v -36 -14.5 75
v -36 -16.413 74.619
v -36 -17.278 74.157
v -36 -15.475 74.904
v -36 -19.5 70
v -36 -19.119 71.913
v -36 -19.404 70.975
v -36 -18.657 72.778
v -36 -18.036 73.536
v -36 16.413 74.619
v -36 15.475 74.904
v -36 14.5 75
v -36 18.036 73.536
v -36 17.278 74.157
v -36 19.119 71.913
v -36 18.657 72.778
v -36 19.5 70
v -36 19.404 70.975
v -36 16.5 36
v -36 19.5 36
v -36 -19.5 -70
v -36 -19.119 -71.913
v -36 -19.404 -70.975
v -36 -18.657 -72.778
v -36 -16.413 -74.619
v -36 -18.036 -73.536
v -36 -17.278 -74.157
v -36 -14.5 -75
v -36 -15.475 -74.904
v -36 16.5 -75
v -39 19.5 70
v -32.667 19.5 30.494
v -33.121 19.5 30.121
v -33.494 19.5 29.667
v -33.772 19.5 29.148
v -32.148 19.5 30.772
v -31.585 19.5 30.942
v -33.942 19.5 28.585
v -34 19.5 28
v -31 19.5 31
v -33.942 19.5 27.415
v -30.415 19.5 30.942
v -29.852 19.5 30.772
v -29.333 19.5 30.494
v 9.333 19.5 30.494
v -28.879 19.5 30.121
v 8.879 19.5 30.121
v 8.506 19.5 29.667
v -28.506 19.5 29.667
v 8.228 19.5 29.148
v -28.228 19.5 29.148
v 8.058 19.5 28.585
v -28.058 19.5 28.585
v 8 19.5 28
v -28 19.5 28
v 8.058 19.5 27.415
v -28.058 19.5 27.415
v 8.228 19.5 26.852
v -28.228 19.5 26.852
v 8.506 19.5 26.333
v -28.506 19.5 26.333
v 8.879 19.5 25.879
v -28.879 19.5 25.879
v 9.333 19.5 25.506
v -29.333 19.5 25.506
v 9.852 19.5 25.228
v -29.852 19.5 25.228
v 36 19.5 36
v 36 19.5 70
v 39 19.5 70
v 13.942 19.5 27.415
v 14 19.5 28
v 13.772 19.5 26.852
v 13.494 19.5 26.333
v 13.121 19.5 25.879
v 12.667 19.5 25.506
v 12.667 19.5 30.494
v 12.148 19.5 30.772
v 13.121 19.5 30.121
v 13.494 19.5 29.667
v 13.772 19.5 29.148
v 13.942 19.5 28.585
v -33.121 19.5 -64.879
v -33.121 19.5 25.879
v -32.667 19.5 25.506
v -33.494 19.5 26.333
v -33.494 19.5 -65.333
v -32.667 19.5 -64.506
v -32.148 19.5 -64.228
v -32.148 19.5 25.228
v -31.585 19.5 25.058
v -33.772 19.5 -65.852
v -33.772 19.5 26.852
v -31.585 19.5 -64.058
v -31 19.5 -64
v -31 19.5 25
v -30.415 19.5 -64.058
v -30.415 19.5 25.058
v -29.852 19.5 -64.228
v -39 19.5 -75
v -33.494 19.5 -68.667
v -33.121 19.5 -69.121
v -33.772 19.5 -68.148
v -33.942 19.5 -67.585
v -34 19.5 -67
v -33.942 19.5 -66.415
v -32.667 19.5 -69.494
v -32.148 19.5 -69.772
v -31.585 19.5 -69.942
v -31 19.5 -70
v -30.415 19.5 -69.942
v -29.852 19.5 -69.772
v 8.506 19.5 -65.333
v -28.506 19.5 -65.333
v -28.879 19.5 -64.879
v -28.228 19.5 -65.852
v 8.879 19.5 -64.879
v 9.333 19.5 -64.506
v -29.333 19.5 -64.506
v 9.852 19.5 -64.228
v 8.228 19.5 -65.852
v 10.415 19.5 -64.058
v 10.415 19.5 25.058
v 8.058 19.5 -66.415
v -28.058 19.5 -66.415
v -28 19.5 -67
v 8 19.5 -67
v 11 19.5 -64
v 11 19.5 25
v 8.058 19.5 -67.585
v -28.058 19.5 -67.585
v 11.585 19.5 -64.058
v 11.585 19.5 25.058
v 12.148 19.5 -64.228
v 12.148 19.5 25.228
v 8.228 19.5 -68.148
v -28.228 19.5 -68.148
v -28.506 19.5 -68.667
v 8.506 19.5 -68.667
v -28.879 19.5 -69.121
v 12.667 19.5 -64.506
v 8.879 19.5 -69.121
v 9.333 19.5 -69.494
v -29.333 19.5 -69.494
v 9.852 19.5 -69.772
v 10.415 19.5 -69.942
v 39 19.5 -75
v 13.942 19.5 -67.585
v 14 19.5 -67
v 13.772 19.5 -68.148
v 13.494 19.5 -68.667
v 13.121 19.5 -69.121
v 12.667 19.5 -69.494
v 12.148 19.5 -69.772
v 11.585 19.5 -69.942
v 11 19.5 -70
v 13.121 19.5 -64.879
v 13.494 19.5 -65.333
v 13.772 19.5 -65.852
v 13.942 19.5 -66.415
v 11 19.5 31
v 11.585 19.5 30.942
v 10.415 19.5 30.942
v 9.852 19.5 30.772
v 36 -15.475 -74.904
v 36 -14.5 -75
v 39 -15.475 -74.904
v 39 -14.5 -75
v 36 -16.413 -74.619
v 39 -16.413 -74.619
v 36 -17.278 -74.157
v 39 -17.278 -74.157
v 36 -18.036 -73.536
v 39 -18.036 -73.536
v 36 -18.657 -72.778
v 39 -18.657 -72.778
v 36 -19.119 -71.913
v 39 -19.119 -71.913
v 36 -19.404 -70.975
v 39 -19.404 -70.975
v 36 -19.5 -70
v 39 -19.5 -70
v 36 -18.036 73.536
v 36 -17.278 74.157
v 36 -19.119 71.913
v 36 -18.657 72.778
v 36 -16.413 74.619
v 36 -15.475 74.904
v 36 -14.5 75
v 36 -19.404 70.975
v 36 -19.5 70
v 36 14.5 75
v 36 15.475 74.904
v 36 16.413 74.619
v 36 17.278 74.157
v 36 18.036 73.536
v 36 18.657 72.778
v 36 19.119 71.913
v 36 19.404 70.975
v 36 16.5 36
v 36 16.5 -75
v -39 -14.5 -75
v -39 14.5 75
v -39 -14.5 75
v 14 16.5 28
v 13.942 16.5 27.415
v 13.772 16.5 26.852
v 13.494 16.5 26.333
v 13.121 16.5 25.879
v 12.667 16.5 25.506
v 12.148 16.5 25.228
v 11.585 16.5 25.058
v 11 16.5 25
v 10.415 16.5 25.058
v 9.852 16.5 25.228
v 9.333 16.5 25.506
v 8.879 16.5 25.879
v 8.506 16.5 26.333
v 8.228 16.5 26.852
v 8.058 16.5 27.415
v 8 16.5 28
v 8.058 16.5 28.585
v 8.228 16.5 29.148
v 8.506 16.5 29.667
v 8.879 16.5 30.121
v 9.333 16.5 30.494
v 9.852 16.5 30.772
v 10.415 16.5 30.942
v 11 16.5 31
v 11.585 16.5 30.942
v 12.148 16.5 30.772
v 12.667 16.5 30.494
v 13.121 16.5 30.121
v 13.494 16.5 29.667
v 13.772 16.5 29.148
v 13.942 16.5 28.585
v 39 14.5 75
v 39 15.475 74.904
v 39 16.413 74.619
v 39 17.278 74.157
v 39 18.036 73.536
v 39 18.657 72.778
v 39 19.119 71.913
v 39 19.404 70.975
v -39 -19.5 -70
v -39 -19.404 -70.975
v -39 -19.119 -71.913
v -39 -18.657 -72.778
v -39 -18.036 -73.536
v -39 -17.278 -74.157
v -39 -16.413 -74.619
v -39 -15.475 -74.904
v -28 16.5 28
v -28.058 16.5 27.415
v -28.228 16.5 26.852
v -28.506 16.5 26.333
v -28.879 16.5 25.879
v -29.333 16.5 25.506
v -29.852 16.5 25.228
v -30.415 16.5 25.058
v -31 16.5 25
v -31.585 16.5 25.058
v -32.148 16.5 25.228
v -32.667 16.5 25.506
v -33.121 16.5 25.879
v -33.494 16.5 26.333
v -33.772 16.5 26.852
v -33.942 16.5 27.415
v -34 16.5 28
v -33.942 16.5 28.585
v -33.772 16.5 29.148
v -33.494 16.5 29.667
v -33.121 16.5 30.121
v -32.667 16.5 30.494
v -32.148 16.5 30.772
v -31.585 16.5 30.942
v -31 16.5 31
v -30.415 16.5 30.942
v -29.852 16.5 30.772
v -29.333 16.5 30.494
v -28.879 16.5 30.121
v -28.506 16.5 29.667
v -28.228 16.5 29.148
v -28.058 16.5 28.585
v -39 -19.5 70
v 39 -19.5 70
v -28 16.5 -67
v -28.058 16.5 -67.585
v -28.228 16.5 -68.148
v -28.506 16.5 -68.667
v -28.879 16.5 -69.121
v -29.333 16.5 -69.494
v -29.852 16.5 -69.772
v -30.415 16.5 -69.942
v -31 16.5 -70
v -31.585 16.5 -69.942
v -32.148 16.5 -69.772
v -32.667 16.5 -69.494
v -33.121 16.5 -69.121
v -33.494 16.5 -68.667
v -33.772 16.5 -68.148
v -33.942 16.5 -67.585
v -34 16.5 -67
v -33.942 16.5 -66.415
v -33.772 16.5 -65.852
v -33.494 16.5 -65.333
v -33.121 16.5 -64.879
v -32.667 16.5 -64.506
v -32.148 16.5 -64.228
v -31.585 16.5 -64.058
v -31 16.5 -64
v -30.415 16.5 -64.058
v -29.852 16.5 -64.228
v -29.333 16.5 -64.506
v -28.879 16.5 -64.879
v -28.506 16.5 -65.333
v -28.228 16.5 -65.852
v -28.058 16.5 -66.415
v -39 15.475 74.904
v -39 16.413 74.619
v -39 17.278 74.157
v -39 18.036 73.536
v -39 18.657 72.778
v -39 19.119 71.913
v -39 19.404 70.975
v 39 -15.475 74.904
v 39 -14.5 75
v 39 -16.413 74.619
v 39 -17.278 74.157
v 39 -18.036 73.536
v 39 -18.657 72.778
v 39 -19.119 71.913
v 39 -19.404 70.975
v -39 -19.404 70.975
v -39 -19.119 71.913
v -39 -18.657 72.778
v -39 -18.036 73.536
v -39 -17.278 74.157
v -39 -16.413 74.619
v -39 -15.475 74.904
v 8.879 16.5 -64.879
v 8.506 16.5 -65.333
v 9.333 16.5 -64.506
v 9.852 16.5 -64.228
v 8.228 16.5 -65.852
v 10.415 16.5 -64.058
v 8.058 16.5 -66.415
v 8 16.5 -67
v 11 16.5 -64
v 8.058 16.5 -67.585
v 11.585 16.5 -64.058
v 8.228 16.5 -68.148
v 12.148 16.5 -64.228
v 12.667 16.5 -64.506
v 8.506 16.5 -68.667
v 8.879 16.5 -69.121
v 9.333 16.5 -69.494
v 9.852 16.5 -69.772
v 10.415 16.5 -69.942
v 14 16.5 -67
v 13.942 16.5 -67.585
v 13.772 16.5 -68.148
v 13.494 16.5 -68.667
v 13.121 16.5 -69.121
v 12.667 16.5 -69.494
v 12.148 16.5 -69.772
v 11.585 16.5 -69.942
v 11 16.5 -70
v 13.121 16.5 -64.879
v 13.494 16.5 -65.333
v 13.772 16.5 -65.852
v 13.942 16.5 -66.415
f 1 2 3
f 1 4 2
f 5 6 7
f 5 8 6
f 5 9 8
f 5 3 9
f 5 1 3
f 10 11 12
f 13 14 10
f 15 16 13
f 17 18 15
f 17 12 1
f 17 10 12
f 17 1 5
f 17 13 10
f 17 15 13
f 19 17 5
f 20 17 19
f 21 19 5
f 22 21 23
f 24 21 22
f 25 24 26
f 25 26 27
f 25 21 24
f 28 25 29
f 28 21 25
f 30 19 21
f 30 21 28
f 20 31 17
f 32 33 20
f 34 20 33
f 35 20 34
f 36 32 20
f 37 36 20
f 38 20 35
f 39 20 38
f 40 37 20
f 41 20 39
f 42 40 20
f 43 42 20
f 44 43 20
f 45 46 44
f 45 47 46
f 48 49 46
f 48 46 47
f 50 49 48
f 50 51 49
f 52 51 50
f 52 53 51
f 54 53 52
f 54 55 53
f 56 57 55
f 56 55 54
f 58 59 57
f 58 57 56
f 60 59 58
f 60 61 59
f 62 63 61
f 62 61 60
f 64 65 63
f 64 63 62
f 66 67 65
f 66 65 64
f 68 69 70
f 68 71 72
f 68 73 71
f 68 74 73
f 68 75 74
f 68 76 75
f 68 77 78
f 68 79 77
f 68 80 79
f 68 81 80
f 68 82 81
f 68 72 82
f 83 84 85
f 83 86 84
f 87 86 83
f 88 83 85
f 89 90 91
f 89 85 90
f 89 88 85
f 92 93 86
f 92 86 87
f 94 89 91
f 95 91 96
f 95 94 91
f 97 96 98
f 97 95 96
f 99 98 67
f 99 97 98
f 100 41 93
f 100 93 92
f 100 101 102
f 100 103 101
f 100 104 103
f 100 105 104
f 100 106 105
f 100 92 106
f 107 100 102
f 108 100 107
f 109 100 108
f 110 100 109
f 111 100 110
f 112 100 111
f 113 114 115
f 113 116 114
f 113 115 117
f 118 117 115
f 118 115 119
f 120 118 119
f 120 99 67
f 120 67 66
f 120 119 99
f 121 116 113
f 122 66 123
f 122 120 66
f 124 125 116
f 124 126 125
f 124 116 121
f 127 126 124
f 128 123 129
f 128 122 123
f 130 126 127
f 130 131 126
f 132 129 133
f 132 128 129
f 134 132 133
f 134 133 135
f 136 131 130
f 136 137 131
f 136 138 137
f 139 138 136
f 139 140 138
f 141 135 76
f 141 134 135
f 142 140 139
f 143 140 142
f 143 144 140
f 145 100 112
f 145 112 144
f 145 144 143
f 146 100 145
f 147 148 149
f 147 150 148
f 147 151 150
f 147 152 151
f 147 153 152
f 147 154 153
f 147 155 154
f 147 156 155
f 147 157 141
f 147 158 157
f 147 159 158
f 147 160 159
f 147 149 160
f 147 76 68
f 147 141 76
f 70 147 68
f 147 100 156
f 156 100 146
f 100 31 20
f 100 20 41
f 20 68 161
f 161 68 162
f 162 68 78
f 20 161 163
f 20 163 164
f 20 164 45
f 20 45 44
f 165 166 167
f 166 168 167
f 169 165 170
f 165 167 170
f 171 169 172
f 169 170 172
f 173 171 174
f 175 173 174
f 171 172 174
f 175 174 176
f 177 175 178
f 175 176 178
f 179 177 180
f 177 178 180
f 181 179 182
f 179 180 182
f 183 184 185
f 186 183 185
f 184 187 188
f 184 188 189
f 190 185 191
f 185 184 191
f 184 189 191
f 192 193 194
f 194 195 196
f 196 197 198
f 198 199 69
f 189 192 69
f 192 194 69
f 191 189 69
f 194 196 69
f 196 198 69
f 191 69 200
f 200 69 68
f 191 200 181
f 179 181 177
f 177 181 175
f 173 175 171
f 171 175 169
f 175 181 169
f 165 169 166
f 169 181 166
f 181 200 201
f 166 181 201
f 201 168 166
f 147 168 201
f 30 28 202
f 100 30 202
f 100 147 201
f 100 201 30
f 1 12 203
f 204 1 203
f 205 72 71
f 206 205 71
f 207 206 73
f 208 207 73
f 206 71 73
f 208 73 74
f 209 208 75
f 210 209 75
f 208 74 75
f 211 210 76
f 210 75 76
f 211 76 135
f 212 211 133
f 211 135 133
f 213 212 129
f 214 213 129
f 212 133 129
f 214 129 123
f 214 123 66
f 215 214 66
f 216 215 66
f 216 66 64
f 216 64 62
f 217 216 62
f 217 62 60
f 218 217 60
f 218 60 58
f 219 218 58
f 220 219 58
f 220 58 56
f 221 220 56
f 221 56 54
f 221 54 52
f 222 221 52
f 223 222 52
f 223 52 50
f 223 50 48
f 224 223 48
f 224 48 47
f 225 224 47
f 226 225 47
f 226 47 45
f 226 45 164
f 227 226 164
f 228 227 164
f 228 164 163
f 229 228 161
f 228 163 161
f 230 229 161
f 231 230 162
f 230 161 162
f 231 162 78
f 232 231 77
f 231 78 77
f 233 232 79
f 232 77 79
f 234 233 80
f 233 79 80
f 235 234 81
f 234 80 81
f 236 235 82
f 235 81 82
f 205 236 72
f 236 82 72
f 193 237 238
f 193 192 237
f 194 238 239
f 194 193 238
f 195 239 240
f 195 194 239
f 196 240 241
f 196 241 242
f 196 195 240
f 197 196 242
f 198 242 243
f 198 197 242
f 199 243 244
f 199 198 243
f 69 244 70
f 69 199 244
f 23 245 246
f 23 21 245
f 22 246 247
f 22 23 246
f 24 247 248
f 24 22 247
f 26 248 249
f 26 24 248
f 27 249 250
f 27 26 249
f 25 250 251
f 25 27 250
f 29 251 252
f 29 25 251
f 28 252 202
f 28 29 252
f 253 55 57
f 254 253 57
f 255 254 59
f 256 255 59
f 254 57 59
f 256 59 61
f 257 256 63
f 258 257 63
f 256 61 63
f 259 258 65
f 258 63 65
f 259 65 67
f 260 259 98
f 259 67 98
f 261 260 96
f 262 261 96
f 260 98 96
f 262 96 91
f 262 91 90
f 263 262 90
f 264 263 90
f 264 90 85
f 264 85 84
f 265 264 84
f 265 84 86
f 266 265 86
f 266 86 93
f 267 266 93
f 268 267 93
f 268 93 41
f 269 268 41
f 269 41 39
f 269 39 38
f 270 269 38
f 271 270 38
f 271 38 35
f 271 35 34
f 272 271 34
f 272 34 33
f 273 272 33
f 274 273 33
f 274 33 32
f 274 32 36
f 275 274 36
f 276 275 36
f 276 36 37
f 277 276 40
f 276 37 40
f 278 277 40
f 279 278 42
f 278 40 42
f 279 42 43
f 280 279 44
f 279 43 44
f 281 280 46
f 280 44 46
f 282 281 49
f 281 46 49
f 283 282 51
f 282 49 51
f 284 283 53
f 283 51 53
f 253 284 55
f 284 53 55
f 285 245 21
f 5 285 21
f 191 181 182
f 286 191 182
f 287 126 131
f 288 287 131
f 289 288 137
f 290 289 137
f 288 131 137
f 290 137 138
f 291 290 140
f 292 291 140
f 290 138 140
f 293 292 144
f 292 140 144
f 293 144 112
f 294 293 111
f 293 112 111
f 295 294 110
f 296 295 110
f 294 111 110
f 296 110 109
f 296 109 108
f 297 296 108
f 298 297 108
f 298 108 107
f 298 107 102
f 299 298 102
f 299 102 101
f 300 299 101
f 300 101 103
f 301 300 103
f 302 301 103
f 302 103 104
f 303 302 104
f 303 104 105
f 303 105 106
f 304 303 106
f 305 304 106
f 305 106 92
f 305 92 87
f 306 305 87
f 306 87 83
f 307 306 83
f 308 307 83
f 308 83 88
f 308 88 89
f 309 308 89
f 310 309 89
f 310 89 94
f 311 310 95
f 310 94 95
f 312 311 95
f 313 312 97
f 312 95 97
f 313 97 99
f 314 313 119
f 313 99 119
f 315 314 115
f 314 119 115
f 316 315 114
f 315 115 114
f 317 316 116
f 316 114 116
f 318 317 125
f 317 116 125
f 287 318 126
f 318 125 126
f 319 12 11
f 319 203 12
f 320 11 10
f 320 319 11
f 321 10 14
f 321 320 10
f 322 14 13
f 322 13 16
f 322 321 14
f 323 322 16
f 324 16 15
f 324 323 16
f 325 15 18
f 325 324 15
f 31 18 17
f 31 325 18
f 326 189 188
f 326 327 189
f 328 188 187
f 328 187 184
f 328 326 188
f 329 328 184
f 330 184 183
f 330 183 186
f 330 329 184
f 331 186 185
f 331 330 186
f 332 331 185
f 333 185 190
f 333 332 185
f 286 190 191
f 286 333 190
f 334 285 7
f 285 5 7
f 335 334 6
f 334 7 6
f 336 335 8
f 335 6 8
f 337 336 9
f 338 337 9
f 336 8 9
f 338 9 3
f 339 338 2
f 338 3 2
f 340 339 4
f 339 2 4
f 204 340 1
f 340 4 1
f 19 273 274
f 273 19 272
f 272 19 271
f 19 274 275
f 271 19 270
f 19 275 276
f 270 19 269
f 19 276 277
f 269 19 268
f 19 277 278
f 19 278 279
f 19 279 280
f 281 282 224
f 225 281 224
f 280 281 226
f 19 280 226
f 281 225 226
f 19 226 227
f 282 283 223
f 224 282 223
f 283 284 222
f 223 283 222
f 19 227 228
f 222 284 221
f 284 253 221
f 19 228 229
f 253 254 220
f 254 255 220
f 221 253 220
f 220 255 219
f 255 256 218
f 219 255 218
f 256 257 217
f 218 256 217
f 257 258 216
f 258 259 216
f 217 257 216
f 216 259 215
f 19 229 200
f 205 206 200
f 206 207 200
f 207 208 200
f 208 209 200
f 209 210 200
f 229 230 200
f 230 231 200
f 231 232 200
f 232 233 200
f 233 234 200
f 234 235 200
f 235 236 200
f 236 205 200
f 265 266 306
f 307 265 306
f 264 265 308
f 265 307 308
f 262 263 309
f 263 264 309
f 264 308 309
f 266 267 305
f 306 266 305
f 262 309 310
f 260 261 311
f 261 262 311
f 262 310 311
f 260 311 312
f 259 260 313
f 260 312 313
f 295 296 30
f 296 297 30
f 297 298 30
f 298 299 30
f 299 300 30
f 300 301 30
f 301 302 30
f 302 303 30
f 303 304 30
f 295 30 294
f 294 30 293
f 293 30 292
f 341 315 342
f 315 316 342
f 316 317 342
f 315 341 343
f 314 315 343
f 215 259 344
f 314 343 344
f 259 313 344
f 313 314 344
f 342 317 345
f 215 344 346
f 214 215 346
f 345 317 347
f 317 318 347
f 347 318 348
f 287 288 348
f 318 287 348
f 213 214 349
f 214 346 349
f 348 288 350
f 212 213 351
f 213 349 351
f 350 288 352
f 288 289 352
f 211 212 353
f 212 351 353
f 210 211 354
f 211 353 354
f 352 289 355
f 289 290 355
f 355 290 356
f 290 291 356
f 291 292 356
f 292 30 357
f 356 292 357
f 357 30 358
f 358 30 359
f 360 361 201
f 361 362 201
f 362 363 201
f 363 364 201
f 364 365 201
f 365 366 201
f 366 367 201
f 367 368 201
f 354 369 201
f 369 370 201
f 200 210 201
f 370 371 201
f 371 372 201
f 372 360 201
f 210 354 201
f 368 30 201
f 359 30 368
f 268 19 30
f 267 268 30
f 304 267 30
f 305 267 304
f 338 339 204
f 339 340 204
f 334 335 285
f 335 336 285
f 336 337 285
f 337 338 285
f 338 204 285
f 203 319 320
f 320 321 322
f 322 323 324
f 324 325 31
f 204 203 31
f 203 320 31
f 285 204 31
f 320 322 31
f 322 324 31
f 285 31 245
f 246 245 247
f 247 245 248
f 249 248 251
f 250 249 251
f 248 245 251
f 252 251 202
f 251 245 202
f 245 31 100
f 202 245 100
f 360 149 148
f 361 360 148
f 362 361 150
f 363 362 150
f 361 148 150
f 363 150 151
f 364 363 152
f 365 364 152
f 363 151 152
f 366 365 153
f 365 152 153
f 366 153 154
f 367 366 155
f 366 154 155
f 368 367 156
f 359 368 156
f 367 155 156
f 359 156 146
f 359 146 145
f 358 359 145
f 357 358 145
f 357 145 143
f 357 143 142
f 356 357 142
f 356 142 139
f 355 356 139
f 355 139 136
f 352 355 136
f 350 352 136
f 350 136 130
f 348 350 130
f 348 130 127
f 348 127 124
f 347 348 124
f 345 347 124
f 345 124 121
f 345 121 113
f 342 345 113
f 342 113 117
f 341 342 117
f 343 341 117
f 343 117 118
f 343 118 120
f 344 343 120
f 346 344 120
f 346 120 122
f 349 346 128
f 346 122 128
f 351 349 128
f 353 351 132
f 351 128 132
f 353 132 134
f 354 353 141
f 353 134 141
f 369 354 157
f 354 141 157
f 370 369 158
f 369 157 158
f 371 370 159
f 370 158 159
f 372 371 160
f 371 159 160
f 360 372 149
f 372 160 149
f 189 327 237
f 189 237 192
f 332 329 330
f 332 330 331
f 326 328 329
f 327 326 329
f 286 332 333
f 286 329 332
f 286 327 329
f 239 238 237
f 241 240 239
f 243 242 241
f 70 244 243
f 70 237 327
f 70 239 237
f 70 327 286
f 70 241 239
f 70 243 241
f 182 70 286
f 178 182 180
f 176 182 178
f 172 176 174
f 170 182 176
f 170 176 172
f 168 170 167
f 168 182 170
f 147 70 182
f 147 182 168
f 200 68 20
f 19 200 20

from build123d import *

# Parameters (mm, degrees)
BOSS_EXTRUDE1_DEPTH = 19.5
SHELL1_T            = -3
SKETCH2_W           = 36
SKETCH2_H           = 39
CUT_EXTRUDE1_DEPTH  = 3
FILLET1_R           = 5
CUT_EXTRUDE2_REACH  = 41
SKETCH3_R           = 3


with BuildPart() as part:
    # Sketch1 → Boss-Extrude1 (new body, symmetric)
    with BuildSketch(Plane(origin=(0, 0, 0), x_dir=(1, 0, 0), z_dir=(0, 1, 0))):
        Polygon((0, -36), (0, -75), (-36, -75), (-39, -75), (-39, 75), (0, 75), (0, 0), align=None)
    boss_extrude1 = extrude(amount=BOSS_EXTRUDE1_DEPTH, both=True)

    # Mirror1: Boss-Extrude1 across plane
    add(boss_extrude1.mirror(Plane(origin=(0, 0, 0), x_dir=(0, 0, 1), z_dir=(1, 0, 0))))

    # Shell1
    shell1_openings = [part.faces().sort_by_distance(p)[0] for p in [
        (0, 0, 75),
        (0, 0, -75),
        (0, -19.5, 0),
    ]]
    offset(amount=SHELL1_T, openings=shell1_openings, kind=Kind.INTERSECTION)

    # Sketch2 → Cut-Extrude1 (cut)
    with BuildSketch(Plane(origin=(0, 19.5, 0), x_dir=(1, 0, 0), z_dir=(0, 1, 0))):
        with Locations((-18, -55.5)):
            Rectangle(SKETCH2_W, SKETCH2_H)
    cut_extrude1 = extrude(amount=-CUT_EXTRUDE1_DEPTH, mode=Mode.SUBTRACT)

    # Mirror2: Cut-Extrude1 across plane
    add(cut_extrude1.mirror(Plane(origin=(0, 0, 0), x_dir=(0, 0, 1), z_dir=(1, 0, 0))), mode=Mode.SUBTRACT)

    # Fillet1
    fillet1_edges = [part.edges().sort_by_distance(p)[0] for p in [
        (-37.5, 19.5, 75),
        (-37.5, -19.5, -75),
        (37.5, -19.5, 75),
        (37.5, 19.5, 75),
        (-37.5, -19.5, 75),
        (37.5, -19.5, -75),
    ]]
    fillet(fillet1_edges, radius=FILLET1_R)

    # Sketch3 → Cut-Extrude2 (cut, up to next)
    with BuildSketch(Plane(origin=(0, 19.5, 0), x_dir=(1, 0, 0), z_dir=(0, 1, 0)), mode=Mode.PRIVATE) as cut_extrude2_sk1:
        with Locations((-31, 67)):
            Circle(SKETCH3_R)
    cut_extrude2_tool1 = extrude(cut_extrude2_sk1.sketch, amount=-CUT_EXTRUDE2_REACH, mode=Mode.PRIVATE) & part.part
    add(cut_extrude2_tool1.solids().sort_by_distance((-31, 19.5, -67))[0], mode=Mode.SUBTRACT)
    # Sketch3 → Cut-Extrude2 (cut, up to next)
    with BuildSketch(Plane(origin=(0, 19.5, 0), x_dir=(1, 0, 0), z_dir=(0, 1, 0)), mode=Mode.PRIVATE) as cut_extrude2_sk2:
        with Locations((-31, -28)):
            Circle(SKETCH3_R)
    cut_extrude2_tool2 = extrude(cut_extrude2_sk2.sketch, amount=-CUT_EXTRUDE2_REACH, mode=Mode.PRIVATE) & part.part
    add(cut_extrude2_tool2.solids().sort_by_distance((-31, 19.5, 28))[0], mode=Mode.SUBTRACT)
    # Sketch3 → Cut-Extrude2 (cut, up to next)
    with BuildSketch(Plane(origin=(0, 19.5, 0), x_dir=(1, 0, 0), z_dir=(0, 1, 0)), mode=Mode.PRIVATE) as cut_extrude2_sk3:
        with Locations((11, -28)):
            Circle(SKETCH3_R)
    cut_extrude2_tool3 = extrude(cut_extrude2_sk3.sketch, amount=-CUT_EXTRUDE2_REACH, mode=Mode.PRIVATE) & part.part
    add(cut_extrude2_tool3.solids().sort_by_distance((11, 19.5, 28))[0], mode=Mode.SUBTRACT)
    # Sketch3 → Cut-Extrude2 (cut, up to next)
    with BuildSketch(Plane(origin=(0, 19.5, 0), x_dir=(1, 0, 0), z_dir=(0, 1, 0)), mode=Mode.PRIVATE) as cut_extrude2_sk4:
        with Locations((11, 67)):
            Circle(SKETCH3_R)
    cut_extrude2_tool4 = extrude(cut_extrude2_sk4.sketch, amount=-CUT_EXTRUDE2_REACH, mode=Mode.PRIVATE) & part.part
    add(cut_extrude2_tool4.solids().sort_by_distance((11, 19.5, -67))[0], mode=Mode.SUBTRACT)


solid = part.part
